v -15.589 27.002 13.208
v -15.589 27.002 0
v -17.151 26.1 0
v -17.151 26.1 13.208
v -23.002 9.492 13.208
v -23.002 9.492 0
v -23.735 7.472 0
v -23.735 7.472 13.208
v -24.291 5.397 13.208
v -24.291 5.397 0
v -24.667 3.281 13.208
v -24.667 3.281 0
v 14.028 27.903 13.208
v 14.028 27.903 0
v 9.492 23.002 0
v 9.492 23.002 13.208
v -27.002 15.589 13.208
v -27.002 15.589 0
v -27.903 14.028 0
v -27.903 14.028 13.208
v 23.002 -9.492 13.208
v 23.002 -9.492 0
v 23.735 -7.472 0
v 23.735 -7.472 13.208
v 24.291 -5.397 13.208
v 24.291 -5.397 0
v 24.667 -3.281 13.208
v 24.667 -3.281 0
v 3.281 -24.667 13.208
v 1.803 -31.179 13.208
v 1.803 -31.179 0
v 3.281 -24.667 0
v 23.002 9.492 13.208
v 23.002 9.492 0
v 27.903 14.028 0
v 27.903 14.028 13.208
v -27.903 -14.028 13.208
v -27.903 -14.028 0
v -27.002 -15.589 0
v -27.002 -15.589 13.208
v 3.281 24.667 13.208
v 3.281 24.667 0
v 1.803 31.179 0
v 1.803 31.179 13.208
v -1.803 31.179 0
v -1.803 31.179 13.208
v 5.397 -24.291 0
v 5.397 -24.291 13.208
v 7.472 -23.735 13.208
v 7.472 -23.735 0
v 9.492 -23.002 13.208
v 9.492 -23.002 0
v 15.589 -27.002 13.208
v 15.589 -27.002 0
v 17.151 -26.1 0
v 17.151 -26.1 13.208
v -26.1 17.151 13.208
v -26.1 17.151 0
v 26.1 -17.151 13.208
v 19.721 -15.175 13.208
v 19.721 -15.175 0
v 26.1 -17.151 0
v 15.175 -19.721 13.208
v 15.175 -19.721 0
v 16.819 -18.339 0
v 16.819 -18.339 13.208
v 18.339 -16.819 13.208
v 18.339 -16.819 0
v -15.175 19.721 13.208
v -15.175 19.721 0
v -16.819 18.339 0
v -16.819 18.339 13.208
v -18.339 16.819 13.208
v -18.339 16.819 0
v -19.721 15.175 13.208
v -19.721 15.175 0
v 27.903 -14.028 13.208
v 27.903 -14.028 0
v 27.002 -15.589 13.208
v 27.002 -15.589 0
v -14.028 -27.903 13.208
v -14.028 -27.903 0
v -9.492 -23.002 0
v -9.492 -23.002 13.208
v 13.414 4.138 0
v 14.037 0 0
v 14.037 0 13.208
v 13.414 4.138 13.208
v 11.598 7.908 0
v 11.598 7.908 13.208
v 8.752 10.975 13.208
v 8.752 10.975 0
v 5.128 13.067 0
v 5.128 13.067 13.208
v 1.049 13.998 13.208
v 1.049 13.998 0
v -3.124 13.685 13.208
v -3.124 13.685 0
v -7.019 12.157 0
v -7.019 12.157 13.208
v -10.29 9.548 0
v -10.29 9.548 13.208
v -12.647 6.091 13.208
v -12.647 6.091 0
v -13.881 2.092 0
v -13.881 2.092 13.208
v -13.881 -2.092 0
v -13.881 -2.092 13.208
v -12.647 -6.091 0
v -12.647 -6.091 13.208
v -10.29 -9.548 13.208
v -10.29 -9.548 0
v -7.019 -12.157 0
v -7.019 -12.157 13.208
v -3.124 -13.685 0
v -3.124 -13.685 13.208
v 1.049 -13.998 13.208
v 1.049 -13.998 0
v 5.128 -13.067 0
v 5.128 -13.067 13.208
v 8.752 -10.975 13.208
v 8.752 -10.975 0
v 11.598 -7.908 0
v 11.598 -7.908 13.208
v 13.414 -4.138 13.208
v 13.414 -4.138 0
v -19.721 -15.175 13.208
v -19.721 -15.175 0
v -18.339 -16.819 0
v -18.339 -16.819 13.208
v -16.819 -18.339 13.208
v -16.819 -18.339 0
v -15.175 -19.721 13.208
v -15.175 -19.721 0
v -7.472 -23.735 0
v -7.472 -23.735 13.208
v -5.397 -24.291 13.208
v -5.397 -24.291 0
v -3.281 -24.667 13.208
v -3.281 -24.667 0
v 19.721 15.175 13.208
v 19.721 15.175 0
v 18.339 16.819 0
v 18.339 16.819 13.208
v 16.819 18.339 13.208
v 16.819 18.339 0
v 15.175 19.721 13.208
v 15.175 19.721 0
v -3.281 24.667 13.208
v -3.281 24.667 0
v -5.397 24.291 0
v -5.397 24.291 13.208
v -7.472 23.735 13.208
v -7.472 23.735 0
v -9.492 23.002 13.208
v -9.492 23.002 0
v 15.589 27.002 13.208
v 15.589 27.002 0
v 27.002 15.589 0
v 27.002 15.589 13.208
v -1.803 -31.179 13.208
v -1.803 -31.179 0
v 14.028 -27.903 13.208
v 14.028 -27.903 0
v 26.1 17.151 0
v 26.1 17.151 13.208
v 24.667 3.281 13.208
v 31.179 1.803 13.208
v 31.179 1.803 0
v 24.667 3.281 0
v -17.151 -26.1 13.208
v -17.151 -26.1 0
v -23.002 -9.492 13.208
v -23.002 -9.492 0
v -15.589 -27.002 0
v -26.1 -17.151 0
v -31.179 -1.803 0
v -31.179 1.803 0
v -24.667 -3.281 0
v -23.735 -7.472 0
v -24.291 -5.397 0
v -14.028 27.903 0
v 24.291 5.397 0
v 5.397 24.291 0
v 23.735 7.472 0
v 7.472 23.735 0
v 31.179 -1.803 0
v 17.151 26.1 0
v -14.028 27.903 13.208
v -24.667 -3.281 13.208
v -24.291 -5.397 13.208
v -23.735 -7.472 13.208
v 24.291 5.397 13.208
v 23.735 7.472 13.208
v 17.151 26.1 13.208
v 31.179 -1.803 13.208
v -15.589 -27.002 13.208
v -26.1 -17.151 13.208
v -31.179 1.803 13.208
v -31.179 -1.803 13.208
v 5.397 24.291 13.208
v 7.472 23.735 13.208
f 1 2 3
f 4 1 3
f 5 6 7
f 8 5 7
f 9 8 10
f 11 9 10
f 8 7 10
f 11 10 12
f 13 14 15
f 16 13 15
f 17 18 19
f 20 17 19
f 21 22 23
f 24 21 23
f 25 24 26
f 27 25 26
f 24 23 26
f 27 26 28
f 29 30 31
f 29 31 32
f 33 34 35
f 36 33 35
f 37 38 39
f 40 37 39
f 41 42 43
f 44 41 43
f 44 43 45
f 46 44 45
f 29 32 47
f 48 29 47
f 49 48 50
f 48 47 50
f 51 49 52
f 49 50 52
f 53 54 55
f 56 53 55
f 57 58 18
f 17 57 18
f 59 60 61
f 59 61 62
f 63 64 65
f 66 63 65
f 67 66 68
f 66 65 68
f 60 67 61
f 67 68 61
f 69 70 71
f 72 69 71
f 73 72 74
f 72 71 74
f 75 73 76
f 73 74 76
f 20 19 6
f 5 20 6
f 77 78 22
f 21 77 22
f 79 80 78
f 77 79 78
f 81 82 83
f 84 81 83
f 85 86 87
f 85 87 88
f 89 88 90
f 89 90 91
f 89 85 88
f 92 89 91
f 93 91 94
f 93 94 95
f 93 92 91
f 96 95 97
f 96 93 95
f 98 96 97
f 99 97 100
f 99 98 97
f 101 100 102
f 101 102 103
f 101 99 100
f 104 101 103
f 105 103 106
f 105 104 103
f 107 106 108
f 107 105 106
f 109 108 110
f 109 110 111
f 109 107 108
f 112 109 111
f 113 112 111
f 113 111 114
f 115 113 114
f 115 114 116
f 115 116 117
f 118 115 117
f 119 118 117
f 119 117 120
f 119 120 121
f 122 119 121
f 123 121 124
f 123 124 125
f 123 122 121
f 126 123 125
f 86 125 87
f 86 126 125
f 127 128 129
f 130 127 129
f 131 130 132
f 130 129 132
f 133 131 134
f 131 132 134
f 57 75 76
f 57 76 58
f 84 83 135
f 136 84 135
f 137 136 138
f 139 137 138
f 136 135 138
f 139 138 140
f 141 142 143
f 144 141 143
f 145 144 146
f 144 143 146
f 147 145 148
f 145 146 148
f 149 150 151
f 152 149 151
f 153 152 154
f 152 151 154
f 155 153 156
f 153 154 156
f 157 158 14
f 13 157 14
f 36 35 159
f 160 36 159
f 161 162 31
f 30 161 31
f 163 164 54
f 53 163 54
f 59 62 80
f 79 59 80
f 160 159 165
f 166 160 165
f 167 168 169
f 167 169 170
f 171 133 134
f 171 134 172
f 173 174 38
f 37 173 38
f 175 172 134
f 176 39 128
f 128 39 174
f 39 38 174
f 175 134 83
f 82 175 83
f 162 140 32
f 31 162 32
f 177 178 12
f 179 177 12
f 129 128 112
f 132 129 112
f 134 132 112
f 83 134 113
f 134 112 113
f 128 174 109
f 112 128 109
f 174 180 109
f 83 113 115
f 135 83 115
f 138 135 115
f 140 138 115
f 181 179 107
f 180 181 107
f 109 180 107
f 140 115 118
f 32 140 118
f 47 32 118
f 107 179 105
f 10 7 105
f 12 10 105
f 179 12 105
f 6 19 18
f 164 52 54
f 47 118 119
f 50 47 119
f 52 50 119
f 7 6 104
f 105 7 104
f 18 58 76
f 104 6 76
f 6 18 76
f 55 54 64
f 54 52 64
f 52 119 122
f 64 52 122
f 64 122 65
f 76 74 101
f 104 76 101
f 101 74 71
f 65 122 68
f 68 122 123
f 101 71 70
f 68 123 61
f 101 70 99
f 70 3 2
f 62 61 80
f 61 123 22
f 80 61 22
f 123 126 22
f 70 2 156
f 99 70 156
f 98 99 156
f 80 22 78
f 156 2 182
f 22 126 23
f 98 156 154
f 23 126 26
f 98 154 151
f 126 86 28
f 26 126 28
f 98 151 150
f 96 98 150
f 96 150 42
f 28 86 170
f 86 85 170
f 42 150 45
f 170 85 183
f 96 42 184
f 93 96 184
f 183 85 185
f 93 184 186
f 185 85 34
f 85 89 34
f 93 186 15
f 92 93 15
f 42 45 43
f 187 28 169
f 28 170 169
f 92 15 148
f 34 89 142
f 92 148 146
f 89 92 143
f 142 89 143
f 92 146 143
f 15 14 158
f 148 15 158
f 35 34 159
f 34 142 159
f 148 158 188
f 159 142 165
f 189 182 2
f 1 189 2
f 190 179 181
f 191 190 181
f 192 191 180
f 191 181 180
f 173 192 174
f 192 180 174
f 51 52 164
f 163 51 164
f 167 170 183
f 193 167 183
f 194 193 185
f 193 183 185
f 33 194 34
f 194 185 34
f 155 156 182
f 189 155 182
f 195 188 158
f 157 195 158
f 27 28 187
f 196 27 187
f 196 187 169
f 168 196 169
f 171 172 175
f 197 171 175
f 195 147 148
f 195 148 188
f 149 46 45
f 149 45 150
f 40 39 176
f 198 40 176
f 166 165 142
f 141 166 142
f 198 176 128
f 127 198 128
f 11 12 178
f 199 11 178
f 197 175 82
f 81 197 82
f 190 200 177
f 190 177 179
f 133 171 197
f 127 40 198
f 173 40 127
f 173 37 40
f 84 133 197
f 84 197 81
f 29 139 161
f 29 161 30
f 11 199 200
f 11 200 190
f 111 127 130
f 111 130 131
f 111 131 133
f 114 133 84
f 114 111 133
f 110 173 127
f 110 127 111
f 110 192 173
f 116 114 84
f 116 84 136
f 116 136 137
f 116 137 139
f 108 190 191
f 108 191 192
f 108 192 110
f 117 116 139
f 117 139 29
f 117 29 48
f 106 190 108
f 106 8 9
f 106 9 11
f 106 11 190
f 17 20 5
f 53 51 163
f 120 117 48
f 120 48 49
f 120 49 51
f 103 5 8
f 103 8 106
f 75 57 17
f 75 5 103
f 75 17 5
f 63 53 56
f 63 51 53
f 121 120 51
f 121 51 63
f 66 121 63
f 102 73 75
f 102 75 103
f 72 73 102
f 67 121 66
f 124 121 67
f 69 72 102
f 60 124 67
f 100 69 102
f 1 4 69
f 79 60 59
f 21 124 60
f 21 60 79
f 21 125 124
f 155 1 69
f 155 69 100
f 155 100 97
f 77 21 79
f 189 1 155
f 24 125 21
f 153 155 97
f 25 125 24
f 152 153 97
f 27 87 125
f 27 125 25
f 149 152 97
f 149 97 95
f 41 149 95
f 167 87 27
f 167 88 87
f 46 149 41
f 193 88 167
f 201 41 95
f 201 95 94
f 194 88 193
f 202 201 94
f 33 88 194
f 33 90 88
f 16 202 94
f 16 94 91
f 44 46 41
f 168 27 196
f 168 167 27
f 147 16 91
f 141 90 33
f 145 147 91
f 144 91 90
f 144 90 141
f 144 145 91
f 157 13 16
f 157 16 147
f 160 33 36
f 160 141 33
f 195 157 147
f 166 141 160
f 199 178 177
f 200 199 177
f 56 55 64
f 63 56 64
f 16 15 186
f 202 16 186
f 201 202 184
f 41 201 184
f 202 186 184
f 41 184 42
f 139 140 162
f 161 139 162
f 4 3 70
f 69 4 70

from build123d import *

# Parameters (mm, degrees)
F0_R     = 14.037326
F1_DEPTH = 13.208


with BuildPart() as f1:
    # F0 (on Top) → F1 (new body)
    with BuildSketch(Plane.XY):
        with BuildLine():
            ThreePointArc((24.666504, -3.280848), (24.82937, -1.644016), (24.883737, 0))
            ThreePointArc((24.883737, 0), (24.82937, 1.644016), (24.666504, 3.280848))
            ThreePointArc((24.666504, 3.280848), (24.035844, 6.440385), (23.002243, 9.491954))
            ThreePointArc((23.002243, 9.491954), (21.549949, 12.441869), (19.721395, 15.17455))
            ThreePointArc((19.721395, 15.17455), (17.595459, 17.595459), (15.17455, 19.721395))
            ThreePointArc((15.17455, 19.721395), (12.441869, 21.549949), (9.491954, 23.002243))
            ThreePointArc((9.491954, 23.002243), (6.440385, 24.035844), (3.280848, 24.666504))
            ThreePointArc((3.280848, 24.666504), (0, 24.883737), (-3.280848, 24.666504))
            ThreePointArc((-3.280848, 24.666504), (-6.440385, 24.035844), (-9.491954, 23.002243))
            ThreePointArc((-9.491954, 23.002243), (-12.441869, 21.549949), (-15.17455, 19.721395))
            ThreePointArc((-15.17455, 19.721395), (-17.595459, 17.595459), (-19.721395, 15.17455))
            ThreePointArc((-19.721395, 15.17455), (-21.549949, 12.441869), (-23.002243, 9.491954))
            ThreePointArc((-23.002243, 9.491954), (-24.035844, 6.440385), (-24.666504, 3.280848))
            ThreePointArc((-24.666504, 3.280848), (-24.883737, 0), (-24.666504, -3.280848))
            ThreePointArc((-24.666504, -3.280848), (-24.035844, -6.440385), (-23.002243, -9.491954))
            ThreePointArc((-23.002243, -9.491954), (-21.549949, -12.441869), (-19.721395, -15.17455))
            ThreePointArc((-19.721395, -15.17455), (-17.595459, -17.595459), (-15.17455, -19.721395))
            ThreePointArc((-15.17455, -19.721395), (-12.441869, -21.549949), (-9.491954, -23.002243))
            ThreePointArc((-9.491954, -23.002243), (-6.440385, -24.035844), (-3.280848, -24.666504))
            ThreePointArc((-3.280848, -24.666504), (0, -24.883737), (3.280848, -24.666504))
            ThreePointArc((3.280848, -24.666504), (6.440385, -24.035844), (9.491954, -23.002243))
            ThreePointArc((9.491954, -23.002243), (12.441869, -21.549949), (15.17455, -19.721395))
            ThreePointArc((15.17455, -19.721395), (17.595459, -17.595459), (19.721395, -15.17455))
            ThreePointArc((19.721395, -15.17455), (21.549949, -12.441869), (23.002243, -9.491954))
            ThreePointArc((23.002243, -9.491954), (24.035844, -6.440385), (24.666504, -3.280848))
        make_face()
        Circle(F0_R, mode=Mode.SUBTRACT)
        with BuildLine():
            ThreePointArc((24.666504, 3.280848), (24.82937, 1.644016), (24.883737, 0))
            ThreePointArc((24.883737, 0), (24.82937, -1.644016), (24.666504, -3.280848))
            Line((24.666504, -3.280848), (31.178985, -1.803033))
            Line((31.178985, -1.803033), (31.178985, 0))
            Line((31.178985, 0), (31.178985, 1.803033))
            Line((31.178985, 1.803033), (24.666504, 3.280848))
        make_face()
        with BuildLine():
            ThreePointArc((19.721395, 15.17455), (21.549949, 12.441869), (23.002243, 9.491954))
            Line((23.002243, 9.491954), (27.903309, 14.02802))
            Line((27.903309, 14.02802), (27.001793, 15.589492))
            Line((27.001793, 15.589492), (26.100276, 17.150965))
            Line((26.100276, 17.150965), (19.721395, 15.17455))
        make_face()
        with BuildLine():
            Line((27.903309, -14.02802), (23.002243, -9.491954))
            ThreePointArc((23.002243, -9.491954), (21.549949, -12.441869), (19.721395, -15.17455))
            Line((19.721395, -15.17455), (26.100276, -17.150965))
            Line((26.100276, -17.150965), (27.001793, -15.589492))
            Line((27.001793, -15.589492), (27.903309, -14.02802))
        make_face()
        with BuildLine():
            ThreePointArc((9.491954, 23.002243), (12.441869, 21.549949), (15.17455, 19.721395))
            Line((15.17455, 19.721395), (17.150965, 26.100276))
            Line((17.150965, 26.100276), (15.589492, 27.001793))
            Line((15.589492, 27.001793), (14.02802, 27.903309))
            Line((14.02802, 27.903309), (9.491954, 23.002243))
        make_face()
        with BuildLine():
            Line((17.150965, -26.100276), (15.17455, -19.721395))
            ThreePointArc((15.17455, -19.721395), (12.441869, -21.549949), (9.491954, -23.002243))
            Line((9.491954, -23.002243), (14.02802, -27.903309))
            Line((14.02802, -27.903309), (15.589492, -27.001793))
            Line((15.589492, -27.001793), (17.150965, -26.100276))
        make_face()
        with BuildLine():
            ThreePointArc((-3.280848, 24.666504), (0, 24.883737), (3.280848, 24.666504))
            Line((3.280848, 24.666504), (1.803033, 31.178985))
            Line((1.803033, 31.178985), (0, 31.178985))
            Line((0, 31.178985), (-1.803033, 31.178985))
            Line((-1.803033, 31.178985), (-3.280848, 24.666504))
        make_face()
        with BuildLine():
            Line((1.803033, -31.178985), (3.280848, -24.666504))
            ThreePointArc((3.280848, -24.666504), (0, -24.883737), (-3.280848, -24.666504))
            Line((-3.280848, -24.666504), (-1.803033, -31.178985))
            Line((-1.803033, -31.178985), (0, -31.178985))
            Line((0, -31.178985), (1.803033, -31.178985))
        make_face()
        with BuildLine():
            ThreePointArc((-15.17455, 19.721395), (-12.441869, 21.549949), (-9.491954, 23.002243))
            Line((-9.491954, 23.002243), (-14.02802, 27.903309))
            Line((-14.02802, 27.903309), (-15.589492, 27.001793))
            Line((-15.589492, 27.001793), (-17.150965, 26.100276))
            Line((-17.150965, 26.100276), (-15.17455, 19.721395))
        make_face()
        with BuildLine():
            Line((-14.02802, -27.903309), (-9.491954, -23.002243))
            ThreePointArc((-9.491954, -23.002243), (-12.441869, -21.549949), (-15.17455, -19.721395))
            Line((-15.17455, -19.721395), (-17.150965, -26.100276))
            Line((-17.150965, -26.100276), (-15.589492, -27.001793))
            Line((-15.589492, -27.001793), (-14.02802, -27.903309))
        make_face()
        with BuildLine():
            ThreePointArc((-23.002243, 9.491954), (-21.549949, 12.441869), (-19.721395, 15.17455))
            Line((-19.721395, 15.17455), (-26.100276, 17.150965))
            Line((-26.100276, 17.150965), (-27.001793, 15.589492))
            Line((-27.001793, 15.589492), (-27.903309, 14.02802))
            Line((-27.903309, 14.02802), (-23.002243, 9.491954))
        make_face()
        with BuildLine():
            Line((-26.100276, -17.150965), (-19.721395, -15.17455))
            ThreePointArc((-19.721395, -15.17455), (-21.549949, -12.441869), (-23.002243, -9.491954))
            Line((-23.002243, -9.491954), (-27.903309, -14.02802))
            Line((-27.903309, -14.02802), (-27.001793, -15.589492))
            Line((-27.001793, -15.589492), (-26.100276, -17.150965))
        make_face()
        with BuildLine():
            ThreePointArc((-24.666504, -3.280848), (-24.883737, 0), (-24.666504, 3.280848))
            Line((-24.666504, 3.280848), (-31.178985, 1.803033))
            Line((-31.178985, 1.803033), (-31.178985, 0))
            Line((-31.178985, 0), (-31.178985, -1.803033))
            Line((-31.178985, -1.803033), (-24.666504, -3.280848))
        make_face()
    extrude(amount=F1_DEPTH)


solid = f1.part
